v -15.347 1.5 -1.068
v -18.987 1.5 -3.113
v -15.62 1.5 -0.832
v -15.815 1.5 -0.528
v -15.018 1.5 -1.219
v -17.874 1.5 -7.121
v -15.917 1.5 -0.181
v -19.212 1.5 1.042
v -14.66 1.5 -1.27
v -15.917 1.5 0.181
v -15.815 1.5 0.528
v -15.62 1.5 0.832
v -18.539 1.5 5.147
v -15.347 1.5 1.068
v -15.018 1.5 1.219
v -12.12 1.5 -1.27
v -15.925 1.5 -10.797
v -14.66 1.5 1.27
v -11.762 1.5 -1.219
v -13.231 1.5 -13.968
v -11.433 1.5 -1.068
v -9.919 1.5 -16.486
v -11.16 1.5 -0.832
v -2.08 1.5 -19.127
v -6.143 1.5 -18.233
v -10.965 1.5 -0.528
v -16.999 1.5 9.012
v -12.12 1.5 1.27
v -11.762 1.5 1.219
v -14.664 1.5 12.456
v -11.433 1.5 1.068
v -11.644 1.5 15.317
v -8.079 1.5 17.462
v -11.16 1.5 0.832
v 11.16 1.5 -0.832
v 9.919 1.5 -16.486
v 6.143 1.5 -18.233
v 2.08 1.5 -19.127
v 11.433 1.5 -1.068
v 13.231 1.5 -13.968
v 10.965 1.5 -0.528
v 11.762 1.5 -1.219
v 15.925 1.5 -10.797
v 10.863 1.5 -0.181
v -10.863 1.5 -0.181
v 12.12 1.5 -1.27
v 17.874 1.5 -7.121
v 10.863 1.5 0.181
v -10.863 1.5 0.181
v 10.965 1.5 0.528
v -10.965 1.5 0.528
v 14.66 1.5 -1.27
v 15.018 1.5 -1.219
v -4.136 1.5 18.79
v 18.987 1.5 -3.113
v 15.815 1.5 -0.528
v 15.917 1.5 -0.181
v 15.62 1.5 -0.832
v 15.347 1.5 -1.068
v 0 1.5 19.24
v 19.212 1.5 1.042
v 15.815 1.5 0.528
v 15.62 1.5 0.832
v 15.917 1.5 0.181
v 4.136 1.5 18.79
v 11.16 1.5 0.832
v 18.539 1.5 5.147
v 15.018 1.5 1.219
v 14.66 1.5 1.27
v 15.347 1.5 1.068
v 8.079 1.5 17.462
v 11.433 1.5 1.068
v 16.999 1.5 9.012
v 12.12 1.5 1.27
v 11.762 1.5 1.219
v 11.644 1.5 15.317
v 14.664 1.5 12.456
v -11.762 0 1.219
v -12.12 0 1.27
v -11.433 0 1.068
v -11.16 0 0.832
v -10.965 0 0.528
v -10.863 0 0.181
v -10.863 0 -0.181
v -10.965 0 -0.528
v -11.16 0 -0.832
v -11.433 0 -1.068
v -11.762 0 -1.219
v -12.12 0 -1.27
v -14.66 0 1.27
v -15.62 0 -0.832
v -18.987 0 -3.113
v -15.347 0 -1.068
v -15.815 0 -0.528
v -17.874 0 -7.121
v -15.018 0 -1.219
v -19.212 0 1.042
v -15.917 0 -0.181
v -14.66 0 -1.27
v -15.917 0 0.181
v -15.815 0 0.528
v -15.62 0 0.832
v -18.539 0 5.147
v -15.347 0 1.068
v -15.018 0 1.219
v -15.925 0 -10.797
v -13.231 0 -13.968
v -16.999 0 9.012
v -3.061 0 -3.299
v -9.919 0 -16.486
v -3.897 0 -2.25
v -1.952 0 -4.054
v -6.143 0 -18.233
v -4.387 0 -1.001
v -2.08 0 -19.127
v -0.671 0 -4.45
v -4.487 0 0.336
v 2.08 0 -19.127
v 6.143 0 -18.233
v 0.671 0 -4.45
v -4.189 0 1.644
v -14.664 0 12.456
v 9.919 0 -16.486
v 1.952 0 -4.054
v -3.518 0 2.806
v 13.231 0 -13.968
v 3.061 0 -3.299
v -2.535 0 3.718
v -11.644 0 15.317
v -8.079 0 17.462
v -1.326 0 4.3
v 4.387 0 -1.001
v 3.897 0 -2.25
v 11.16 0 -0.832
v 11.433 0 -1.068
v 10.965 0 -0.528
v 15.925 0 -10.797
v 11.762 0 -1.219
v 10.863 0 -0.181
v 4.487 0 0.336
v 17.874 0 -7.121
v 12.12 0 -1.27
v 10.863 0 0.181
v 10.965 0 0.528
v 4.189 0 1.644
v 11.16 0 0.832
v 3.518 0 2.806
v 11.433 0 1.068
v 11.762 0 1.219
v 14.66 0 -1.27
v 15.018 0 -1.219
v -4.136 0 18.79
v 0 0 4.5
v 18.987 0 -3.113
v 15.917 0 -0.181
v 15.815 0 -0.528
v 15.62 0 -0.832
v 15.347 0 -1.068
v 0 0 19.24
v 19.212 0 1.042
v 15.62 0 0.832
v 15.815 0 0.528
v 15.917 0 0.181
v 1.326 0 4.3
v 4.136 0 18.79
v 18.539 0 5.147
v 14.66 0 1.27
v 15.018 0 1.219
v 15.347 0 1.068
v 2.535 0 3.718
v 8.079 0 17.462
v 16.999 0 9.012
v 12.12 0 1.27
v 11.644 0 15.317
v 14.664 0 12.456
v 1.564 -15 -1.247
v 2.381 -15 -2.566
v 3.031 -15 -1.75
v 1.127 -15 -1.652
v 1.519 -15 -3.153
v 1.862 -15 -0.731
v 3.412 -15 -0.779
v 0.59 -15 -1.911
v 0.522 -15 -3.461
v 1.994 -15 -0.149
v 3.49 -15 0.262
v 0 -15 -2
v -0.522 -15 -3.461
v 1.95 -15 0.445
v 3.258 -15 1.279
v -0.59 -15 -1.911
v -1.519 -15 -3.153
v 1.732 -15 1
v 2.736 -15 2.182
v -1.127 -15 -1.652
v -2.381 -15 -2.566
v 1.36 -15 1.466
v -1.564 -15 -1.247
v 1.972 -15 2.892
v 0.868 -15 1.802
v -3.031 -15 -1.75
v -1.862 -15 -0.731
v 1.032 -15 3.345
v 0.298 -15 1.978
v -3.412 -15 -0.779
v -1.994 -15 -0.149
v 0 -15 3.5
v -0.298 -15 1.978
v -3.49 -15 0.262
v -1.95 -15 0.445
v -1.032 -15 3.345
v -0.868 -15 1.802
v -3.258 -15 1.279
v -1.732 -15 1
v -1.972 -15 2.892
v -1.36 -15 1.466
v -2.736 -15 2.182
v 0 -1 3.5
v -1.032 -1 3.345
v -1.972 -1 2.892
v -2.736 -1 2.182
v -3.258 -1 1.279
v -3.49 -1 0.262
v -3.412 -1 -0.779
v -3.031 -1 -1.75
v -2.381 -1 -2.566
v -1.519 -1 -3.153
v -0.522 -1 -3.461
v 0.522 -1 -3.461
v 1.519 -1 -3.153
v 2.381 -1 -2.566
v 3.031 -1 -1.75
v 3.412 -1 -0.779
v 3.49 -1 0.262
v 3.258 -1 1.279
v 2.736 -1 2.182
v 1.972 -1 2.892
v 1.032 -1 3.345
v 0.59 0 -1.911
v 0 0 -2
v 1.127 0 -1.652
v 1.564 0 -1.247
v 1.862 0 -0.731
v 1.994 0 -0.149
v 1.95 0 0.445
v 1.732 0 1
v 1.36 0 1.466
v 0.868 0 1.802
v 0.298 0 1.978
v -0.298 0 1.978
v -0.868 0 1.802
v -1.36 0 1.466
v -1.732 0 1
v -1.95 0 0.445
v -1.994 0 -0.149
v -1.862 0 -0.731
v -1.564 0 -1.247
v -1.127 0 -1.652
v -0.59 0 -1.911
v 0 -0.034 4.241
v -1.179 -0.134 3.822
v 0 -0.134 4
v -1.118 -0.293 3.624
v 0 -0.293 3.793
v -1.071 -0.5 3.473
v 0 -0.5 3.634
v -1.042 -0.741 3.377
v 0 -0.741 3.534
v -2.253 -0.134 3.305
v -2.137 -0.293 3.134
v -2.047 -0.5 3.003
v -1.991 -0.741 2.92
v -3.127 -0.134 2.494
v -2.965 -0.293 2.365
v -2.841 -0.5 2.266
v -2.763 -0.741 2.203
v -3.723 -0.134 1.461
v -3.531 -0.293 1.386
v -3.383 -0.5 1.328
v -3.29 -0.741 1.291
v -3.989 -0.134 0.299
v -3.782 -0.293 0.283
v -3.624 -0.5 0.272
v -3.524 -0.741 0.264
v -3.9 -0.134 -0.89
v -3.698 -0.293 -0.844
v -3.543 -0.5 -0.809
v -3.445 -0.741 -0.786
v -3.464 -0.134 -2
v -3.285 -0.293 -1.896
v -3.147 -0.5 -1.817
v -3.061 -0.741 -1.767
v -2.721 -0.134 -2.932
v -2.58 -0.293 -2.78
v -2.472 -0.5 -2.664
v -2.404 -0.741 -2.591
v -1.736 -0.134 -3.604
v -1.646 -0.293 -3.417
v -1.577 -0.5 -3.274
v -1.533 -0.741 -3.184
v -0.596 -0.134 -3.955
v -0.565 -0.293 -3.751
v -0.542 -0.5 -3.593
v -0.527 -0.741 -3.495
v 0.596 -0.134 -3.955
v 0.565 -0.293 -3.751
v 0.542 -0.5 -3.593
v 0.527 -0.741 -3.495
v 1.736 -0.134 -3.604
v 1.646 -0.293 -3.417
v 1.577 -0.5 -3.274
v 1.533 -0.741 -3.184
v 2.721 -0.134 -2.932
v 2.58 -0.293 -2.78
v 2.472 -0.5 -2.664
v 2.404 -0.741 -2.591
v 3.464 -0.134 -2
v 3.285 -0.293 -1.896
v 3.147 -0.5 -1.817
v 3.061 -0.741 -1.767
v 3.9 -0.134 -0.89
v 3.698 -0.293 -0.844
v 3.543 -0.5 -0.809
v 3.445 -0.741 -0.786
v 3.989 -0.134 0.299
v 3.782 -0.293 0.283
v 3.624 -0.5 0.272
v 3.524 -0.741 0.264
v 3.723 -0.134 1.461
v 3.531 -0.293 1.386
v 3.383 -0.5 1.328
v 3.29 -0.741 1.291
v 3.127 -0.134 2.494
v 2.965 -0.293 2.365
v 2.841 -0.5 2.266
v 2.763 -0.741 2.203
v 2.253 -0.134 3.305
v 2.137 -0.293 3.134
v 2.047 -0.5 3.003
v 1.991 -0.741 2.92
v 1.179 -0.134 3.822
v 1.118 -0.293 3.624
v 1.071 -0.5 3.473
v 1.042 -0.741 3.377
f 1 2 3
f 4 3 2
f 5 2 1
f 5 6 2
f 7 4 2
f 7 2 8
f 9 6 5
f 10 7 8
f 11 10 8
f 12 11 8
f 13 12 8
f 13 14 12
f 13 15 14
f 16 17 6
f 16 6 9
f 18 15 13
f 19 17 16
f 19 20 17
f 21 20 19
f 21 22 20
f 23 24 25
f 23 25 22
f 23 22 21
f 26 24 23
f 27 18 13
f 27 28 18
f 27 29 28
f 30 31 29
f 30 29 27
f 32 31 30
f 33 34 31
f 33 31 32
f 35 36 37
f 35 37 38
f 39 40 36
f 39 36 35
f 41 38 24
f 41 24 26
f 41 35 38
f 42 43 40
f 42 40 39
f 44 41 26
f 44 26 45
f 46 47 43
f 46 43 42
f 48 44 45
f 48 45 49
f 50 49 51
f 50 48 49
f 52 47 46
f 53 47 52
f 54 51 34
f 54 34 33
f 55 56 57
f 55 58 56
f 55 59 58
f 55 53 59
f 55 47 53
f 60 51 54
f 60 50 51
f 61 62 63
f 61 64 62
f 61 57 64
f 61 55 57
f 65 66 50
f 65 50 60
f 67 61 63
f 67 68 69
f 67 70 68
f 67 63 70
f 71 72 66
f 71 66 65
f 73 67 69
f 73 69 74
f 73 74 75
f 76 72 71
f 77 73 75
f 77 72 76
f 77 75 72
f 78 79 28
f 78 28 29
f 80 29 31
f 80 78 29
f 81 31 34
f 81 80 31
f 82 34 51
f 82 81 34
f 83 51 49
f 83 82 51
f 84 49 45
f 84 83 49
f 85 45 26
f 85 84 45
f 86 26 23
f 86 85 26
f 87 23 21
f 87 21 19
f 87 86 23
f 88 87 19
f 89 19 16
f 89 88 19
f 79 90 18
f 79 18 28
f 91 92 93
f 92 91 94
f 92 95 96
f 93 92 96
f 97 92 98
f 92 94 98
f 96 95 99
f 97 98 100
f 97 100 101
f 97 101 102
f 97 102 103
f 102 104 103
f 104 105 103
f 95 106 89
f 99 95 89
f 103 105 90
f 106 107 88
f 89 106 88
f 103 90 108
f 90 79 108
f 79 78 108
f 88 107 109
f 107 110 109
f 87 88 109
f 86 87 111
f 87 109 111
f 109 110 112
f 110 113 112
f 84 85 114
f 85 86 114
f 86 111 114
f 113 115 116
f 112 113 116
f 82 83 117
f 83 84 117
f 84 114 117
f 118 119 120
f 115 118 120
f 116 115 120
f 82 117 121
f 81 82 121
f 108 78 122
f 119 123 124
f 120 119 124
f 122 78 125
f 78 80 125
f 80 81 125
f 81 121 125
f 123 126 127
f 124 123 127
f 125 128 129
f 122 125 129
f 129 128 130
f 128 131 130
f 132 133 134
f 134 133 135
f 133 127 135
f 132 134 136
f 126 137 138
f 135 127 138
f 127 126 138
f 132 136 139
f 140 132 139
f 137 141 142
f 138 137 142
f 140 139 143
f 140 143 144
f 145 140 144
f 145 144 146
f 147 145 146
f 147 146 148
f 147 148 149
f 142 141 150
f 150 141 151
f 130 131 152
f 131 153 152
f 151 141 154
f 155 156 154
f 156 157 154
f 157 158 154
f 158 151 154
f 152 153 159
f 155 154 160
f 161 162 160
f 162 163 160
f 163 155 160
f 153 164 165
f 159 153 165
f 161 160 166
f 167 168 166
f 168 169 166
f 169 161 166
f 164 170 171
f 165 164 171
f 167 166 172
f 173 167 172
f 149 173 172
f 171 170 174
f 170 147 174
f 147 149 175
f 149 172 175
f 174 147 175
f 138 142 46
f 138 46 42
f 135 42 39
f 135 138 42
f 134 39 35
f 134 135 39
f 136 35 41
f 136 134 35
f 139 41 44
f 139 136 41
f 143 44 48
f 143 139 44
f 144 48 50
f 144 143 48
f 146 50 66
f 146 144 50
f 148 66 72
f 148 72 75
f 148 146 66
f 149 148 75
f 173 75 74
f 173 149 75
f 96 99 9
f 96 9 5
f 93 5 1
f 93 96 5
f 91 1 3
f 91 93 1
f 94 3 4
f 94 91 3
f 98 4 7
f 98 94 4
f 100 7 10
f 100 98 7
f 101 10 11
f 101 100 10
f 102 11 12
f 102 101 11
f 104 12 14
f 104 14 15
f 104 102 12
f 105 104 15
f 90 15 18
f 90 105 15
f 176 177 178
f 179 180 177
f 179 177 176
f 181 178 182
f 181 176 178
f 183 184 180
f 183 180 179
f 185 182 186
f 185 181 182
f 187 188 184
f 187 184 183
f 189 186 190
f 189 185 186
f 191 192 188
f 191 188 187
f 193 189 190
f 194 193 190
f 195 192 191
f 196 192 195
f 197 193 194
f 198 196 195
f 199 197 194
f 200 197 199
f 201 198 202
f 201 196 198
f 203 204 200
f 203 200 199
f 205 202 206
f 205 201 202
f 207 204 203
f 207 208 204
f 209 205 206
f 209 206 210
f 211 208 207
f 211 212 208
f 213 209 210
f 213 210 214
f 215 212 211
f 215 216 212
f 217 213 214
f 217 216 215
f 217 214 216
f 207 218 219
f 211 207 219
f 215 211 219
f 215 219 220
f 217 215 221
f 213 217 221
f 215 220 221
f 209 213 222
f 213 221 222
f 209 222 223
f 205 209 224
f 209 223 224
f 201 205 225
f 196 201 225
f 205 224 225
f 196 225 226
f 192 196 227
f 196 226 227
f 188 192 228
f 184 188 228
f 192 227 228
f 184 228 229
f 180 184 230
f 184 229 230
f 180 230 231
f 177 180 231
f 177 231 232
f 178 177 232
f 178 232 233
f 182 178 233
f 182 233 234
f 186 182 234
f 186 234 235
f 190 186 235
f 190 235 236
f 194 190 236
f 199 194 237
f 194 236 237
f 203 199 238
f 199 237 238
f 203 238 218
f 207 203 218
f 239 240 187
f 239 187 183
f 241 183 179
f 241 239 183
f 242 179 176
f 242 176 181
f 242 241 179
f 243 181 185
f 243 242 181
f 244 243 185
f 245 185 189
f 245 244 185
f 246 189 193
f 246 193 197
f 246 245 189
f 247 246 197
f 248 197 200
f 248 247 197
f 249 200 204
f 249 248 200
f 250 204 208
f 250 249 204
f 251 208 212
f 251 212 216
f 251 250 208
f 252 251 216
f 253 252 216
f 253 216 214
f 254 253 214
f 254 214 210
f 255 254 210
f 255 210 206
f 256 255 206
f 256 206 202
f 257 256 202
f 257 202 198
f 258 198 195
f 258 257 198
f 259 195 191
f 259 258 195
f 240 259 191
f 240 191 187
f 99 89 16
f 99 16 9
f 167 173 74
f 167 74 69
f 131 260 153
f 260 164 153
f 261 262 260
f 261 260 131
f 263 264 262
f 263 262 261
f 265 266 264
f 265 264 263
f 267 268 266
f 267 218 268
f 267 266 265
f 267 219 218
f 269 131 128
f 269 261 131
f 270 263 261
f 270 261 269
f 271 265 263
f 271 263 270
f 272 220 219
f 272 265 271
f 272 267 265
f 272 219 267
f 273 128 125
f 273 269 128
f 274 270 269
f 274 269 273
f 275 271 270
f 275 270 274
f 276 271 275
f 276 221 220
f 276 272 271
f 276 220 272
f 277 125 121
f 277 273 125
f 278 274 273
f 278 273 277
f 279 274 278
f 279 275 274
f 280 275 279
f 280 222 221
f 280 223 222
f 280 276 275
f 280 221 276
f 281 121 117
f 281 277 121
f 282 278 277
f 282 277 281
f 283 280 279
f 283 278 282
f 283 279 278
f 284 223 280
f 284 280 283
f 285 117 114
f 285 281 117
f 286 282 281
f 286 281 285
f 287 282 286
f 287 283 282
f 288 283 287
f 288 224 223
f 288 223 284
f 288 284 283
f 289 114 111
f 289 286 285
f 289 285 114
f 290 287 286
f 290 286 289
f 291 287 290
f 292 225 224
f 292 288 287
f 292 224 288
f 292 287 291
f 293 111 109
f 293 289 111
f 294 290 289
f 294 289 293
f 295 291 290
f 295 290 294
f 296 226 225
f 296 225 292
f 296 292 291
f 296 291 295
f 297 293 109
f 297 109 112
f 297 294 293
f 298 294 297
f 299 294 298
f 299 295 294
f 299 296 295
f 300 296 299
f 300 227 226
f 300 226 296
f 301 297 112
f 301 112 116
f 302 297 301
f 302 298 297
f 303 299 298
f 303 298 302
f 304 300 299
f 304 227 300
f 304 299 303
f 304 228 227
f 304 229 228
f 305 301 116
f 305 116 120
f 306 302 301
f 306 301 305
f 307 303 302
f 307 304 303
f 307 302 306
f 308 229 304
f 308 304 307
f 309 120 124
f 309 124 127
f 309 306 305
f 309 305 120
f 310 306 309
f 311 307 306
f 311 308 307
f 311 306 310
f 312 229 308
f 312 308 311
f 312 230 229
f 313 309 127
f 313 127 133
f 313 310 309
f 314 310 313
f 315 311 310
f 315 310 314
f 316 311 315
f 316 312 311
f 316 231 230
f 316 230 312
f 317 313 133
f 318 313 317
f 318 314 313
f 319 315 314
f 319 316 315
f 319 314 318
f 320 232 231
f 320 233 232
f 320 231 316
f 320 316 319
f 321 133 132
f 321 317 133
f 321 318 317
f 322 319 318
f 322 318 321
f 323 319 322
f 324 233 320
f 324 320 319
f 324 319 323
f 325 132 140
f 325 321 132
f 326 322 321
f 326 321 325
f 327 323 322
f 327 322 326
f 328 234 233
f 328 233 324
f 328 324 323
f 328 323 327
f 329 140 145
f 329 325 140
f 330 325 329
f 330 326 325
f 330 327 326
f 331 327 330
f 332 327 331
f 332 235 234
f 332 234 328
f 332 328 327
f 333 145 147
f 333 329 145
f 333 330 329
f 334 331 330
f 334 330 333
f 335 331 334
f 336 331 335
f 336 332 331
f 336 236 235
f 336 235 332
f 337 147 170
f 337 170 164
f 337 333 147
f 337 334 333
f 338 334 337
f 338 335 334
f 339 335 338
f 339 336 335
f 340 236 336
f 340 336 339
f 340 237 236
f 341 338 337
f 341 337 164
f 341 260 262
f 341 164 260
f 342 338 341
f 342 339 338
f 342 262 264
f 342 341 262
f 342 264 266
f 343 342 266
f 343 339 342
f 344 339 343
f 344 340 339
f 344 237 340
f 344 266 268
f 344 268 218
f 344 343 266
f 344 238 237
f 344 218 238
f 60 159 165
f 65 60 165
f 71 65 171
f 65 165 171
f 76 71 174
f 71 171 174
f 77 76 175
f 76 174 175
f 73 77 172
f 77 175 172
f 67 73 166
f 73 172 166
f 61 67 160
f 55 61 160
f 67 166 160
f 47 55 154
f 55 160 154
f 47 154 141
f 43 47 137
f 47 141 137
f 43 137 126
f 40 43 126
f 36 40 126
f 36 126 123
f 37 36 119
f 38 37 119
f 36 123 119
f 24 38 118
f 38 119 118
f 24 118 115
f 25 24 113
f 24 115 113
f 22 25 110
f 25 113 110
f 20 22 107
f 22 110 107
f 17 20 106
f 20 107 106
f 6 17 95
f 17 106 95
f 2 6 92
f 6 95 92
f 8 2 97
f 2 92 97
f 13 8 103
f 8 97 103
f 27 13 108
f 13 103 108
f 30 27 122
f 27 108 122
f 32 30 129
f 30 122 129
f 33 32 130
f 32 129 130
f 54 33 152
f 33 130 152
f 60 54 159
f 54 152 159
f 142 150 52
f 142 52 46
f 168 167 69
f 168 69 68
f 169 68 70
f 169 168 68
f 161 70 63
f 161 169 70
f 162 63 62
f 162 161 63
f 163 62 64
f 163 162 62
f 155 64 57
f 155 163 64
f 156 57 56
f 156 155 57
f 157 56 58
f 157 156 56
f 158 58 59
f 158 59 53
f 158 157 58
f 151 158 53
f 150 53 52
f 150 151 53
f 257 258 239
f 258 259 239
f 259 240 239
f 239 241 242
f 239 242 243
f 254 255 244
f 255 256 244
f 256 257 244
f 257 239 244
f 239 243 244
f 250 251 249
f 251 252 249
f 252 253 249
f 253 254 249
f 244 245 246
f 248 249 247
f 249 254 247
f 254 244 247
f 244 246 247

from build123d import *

# Parameters (mm, degrees)
SKETCH1_R           = 19.24
BOSS_EXTRUDE1_DEPTH = 1.5
SKETCH2_R           = 3.5
SKETCH2_R_2         = 2
BOSS_EXTRUDE2_DEPTH = 15
FILLET1_R           = 1


with BuildPart() as part:
    # Sketch1 → Boss-Extrude1 (new body)
    with BuildSketch(Plane(origin=(0, 0, 0), x_dir=(1, 0, 0), z_dir=(0, 1, 0))):
        with Locations(Location((0, 0, 0), (0, 0, 270))):
            Circle(SKETCH1_R)
        with BuildLine():
            Line((14.66, 1.27), (12.12, 1.27))
            ThreePointArc((12.12, 1.27), (10.85, 0), (12.12, -1.27))
            Line((12.12, -1.27), (14.66, -1.27))
            ThreePointArc((14.66, -1.27), (15.93, 0), (14.66, 1.27))
        make_face(mode=Mode.SUBTRACT)
        with BuildLine():
            Line((-14.66, -1.27), (-12.12, -1.27))
            ThreePointArc((-12.12, -1.27), (-10.85, 0), (-12.12, 1.27))
            Line((-12.12, 1.27), (-14.66, 1.27))
            ThreePointArc((-14.66, 1.27), (-15.93, 0), (-14.66, -1.27))
        make_face(mode=Mode.SUBTRACT)
    extrude(amount=BOSS_EXTRUDE1_DEPTH)

    # Sketch2 → Boss-Extrude2 (add)
    with BuildSketch(Plane(origin=(0, 0, 0), x_dir=(-1, 0, 0), z_dir=(0, -1, 0))):
        with Locations(Location((0, 0, 0), (0, 0, 270))):
            Circle(SKETCH2_R)
        with Locations(Location((0, 0, 0), (0, 0, 90))):
            Circle(SKETCH2_R_2, mode=Mode.SUBTRACT)
    extrude(amount=BOSS_EXTRUDE2_DEPTH)

    # Fillet1
    fillet1_edges = [part.edges().sort_by_distance(p)[0] for p in [
        (0, 0, -3.5),
    ]]
    fillet(fillet1_edges, radius=FILLET1_R)


solid = part.part
